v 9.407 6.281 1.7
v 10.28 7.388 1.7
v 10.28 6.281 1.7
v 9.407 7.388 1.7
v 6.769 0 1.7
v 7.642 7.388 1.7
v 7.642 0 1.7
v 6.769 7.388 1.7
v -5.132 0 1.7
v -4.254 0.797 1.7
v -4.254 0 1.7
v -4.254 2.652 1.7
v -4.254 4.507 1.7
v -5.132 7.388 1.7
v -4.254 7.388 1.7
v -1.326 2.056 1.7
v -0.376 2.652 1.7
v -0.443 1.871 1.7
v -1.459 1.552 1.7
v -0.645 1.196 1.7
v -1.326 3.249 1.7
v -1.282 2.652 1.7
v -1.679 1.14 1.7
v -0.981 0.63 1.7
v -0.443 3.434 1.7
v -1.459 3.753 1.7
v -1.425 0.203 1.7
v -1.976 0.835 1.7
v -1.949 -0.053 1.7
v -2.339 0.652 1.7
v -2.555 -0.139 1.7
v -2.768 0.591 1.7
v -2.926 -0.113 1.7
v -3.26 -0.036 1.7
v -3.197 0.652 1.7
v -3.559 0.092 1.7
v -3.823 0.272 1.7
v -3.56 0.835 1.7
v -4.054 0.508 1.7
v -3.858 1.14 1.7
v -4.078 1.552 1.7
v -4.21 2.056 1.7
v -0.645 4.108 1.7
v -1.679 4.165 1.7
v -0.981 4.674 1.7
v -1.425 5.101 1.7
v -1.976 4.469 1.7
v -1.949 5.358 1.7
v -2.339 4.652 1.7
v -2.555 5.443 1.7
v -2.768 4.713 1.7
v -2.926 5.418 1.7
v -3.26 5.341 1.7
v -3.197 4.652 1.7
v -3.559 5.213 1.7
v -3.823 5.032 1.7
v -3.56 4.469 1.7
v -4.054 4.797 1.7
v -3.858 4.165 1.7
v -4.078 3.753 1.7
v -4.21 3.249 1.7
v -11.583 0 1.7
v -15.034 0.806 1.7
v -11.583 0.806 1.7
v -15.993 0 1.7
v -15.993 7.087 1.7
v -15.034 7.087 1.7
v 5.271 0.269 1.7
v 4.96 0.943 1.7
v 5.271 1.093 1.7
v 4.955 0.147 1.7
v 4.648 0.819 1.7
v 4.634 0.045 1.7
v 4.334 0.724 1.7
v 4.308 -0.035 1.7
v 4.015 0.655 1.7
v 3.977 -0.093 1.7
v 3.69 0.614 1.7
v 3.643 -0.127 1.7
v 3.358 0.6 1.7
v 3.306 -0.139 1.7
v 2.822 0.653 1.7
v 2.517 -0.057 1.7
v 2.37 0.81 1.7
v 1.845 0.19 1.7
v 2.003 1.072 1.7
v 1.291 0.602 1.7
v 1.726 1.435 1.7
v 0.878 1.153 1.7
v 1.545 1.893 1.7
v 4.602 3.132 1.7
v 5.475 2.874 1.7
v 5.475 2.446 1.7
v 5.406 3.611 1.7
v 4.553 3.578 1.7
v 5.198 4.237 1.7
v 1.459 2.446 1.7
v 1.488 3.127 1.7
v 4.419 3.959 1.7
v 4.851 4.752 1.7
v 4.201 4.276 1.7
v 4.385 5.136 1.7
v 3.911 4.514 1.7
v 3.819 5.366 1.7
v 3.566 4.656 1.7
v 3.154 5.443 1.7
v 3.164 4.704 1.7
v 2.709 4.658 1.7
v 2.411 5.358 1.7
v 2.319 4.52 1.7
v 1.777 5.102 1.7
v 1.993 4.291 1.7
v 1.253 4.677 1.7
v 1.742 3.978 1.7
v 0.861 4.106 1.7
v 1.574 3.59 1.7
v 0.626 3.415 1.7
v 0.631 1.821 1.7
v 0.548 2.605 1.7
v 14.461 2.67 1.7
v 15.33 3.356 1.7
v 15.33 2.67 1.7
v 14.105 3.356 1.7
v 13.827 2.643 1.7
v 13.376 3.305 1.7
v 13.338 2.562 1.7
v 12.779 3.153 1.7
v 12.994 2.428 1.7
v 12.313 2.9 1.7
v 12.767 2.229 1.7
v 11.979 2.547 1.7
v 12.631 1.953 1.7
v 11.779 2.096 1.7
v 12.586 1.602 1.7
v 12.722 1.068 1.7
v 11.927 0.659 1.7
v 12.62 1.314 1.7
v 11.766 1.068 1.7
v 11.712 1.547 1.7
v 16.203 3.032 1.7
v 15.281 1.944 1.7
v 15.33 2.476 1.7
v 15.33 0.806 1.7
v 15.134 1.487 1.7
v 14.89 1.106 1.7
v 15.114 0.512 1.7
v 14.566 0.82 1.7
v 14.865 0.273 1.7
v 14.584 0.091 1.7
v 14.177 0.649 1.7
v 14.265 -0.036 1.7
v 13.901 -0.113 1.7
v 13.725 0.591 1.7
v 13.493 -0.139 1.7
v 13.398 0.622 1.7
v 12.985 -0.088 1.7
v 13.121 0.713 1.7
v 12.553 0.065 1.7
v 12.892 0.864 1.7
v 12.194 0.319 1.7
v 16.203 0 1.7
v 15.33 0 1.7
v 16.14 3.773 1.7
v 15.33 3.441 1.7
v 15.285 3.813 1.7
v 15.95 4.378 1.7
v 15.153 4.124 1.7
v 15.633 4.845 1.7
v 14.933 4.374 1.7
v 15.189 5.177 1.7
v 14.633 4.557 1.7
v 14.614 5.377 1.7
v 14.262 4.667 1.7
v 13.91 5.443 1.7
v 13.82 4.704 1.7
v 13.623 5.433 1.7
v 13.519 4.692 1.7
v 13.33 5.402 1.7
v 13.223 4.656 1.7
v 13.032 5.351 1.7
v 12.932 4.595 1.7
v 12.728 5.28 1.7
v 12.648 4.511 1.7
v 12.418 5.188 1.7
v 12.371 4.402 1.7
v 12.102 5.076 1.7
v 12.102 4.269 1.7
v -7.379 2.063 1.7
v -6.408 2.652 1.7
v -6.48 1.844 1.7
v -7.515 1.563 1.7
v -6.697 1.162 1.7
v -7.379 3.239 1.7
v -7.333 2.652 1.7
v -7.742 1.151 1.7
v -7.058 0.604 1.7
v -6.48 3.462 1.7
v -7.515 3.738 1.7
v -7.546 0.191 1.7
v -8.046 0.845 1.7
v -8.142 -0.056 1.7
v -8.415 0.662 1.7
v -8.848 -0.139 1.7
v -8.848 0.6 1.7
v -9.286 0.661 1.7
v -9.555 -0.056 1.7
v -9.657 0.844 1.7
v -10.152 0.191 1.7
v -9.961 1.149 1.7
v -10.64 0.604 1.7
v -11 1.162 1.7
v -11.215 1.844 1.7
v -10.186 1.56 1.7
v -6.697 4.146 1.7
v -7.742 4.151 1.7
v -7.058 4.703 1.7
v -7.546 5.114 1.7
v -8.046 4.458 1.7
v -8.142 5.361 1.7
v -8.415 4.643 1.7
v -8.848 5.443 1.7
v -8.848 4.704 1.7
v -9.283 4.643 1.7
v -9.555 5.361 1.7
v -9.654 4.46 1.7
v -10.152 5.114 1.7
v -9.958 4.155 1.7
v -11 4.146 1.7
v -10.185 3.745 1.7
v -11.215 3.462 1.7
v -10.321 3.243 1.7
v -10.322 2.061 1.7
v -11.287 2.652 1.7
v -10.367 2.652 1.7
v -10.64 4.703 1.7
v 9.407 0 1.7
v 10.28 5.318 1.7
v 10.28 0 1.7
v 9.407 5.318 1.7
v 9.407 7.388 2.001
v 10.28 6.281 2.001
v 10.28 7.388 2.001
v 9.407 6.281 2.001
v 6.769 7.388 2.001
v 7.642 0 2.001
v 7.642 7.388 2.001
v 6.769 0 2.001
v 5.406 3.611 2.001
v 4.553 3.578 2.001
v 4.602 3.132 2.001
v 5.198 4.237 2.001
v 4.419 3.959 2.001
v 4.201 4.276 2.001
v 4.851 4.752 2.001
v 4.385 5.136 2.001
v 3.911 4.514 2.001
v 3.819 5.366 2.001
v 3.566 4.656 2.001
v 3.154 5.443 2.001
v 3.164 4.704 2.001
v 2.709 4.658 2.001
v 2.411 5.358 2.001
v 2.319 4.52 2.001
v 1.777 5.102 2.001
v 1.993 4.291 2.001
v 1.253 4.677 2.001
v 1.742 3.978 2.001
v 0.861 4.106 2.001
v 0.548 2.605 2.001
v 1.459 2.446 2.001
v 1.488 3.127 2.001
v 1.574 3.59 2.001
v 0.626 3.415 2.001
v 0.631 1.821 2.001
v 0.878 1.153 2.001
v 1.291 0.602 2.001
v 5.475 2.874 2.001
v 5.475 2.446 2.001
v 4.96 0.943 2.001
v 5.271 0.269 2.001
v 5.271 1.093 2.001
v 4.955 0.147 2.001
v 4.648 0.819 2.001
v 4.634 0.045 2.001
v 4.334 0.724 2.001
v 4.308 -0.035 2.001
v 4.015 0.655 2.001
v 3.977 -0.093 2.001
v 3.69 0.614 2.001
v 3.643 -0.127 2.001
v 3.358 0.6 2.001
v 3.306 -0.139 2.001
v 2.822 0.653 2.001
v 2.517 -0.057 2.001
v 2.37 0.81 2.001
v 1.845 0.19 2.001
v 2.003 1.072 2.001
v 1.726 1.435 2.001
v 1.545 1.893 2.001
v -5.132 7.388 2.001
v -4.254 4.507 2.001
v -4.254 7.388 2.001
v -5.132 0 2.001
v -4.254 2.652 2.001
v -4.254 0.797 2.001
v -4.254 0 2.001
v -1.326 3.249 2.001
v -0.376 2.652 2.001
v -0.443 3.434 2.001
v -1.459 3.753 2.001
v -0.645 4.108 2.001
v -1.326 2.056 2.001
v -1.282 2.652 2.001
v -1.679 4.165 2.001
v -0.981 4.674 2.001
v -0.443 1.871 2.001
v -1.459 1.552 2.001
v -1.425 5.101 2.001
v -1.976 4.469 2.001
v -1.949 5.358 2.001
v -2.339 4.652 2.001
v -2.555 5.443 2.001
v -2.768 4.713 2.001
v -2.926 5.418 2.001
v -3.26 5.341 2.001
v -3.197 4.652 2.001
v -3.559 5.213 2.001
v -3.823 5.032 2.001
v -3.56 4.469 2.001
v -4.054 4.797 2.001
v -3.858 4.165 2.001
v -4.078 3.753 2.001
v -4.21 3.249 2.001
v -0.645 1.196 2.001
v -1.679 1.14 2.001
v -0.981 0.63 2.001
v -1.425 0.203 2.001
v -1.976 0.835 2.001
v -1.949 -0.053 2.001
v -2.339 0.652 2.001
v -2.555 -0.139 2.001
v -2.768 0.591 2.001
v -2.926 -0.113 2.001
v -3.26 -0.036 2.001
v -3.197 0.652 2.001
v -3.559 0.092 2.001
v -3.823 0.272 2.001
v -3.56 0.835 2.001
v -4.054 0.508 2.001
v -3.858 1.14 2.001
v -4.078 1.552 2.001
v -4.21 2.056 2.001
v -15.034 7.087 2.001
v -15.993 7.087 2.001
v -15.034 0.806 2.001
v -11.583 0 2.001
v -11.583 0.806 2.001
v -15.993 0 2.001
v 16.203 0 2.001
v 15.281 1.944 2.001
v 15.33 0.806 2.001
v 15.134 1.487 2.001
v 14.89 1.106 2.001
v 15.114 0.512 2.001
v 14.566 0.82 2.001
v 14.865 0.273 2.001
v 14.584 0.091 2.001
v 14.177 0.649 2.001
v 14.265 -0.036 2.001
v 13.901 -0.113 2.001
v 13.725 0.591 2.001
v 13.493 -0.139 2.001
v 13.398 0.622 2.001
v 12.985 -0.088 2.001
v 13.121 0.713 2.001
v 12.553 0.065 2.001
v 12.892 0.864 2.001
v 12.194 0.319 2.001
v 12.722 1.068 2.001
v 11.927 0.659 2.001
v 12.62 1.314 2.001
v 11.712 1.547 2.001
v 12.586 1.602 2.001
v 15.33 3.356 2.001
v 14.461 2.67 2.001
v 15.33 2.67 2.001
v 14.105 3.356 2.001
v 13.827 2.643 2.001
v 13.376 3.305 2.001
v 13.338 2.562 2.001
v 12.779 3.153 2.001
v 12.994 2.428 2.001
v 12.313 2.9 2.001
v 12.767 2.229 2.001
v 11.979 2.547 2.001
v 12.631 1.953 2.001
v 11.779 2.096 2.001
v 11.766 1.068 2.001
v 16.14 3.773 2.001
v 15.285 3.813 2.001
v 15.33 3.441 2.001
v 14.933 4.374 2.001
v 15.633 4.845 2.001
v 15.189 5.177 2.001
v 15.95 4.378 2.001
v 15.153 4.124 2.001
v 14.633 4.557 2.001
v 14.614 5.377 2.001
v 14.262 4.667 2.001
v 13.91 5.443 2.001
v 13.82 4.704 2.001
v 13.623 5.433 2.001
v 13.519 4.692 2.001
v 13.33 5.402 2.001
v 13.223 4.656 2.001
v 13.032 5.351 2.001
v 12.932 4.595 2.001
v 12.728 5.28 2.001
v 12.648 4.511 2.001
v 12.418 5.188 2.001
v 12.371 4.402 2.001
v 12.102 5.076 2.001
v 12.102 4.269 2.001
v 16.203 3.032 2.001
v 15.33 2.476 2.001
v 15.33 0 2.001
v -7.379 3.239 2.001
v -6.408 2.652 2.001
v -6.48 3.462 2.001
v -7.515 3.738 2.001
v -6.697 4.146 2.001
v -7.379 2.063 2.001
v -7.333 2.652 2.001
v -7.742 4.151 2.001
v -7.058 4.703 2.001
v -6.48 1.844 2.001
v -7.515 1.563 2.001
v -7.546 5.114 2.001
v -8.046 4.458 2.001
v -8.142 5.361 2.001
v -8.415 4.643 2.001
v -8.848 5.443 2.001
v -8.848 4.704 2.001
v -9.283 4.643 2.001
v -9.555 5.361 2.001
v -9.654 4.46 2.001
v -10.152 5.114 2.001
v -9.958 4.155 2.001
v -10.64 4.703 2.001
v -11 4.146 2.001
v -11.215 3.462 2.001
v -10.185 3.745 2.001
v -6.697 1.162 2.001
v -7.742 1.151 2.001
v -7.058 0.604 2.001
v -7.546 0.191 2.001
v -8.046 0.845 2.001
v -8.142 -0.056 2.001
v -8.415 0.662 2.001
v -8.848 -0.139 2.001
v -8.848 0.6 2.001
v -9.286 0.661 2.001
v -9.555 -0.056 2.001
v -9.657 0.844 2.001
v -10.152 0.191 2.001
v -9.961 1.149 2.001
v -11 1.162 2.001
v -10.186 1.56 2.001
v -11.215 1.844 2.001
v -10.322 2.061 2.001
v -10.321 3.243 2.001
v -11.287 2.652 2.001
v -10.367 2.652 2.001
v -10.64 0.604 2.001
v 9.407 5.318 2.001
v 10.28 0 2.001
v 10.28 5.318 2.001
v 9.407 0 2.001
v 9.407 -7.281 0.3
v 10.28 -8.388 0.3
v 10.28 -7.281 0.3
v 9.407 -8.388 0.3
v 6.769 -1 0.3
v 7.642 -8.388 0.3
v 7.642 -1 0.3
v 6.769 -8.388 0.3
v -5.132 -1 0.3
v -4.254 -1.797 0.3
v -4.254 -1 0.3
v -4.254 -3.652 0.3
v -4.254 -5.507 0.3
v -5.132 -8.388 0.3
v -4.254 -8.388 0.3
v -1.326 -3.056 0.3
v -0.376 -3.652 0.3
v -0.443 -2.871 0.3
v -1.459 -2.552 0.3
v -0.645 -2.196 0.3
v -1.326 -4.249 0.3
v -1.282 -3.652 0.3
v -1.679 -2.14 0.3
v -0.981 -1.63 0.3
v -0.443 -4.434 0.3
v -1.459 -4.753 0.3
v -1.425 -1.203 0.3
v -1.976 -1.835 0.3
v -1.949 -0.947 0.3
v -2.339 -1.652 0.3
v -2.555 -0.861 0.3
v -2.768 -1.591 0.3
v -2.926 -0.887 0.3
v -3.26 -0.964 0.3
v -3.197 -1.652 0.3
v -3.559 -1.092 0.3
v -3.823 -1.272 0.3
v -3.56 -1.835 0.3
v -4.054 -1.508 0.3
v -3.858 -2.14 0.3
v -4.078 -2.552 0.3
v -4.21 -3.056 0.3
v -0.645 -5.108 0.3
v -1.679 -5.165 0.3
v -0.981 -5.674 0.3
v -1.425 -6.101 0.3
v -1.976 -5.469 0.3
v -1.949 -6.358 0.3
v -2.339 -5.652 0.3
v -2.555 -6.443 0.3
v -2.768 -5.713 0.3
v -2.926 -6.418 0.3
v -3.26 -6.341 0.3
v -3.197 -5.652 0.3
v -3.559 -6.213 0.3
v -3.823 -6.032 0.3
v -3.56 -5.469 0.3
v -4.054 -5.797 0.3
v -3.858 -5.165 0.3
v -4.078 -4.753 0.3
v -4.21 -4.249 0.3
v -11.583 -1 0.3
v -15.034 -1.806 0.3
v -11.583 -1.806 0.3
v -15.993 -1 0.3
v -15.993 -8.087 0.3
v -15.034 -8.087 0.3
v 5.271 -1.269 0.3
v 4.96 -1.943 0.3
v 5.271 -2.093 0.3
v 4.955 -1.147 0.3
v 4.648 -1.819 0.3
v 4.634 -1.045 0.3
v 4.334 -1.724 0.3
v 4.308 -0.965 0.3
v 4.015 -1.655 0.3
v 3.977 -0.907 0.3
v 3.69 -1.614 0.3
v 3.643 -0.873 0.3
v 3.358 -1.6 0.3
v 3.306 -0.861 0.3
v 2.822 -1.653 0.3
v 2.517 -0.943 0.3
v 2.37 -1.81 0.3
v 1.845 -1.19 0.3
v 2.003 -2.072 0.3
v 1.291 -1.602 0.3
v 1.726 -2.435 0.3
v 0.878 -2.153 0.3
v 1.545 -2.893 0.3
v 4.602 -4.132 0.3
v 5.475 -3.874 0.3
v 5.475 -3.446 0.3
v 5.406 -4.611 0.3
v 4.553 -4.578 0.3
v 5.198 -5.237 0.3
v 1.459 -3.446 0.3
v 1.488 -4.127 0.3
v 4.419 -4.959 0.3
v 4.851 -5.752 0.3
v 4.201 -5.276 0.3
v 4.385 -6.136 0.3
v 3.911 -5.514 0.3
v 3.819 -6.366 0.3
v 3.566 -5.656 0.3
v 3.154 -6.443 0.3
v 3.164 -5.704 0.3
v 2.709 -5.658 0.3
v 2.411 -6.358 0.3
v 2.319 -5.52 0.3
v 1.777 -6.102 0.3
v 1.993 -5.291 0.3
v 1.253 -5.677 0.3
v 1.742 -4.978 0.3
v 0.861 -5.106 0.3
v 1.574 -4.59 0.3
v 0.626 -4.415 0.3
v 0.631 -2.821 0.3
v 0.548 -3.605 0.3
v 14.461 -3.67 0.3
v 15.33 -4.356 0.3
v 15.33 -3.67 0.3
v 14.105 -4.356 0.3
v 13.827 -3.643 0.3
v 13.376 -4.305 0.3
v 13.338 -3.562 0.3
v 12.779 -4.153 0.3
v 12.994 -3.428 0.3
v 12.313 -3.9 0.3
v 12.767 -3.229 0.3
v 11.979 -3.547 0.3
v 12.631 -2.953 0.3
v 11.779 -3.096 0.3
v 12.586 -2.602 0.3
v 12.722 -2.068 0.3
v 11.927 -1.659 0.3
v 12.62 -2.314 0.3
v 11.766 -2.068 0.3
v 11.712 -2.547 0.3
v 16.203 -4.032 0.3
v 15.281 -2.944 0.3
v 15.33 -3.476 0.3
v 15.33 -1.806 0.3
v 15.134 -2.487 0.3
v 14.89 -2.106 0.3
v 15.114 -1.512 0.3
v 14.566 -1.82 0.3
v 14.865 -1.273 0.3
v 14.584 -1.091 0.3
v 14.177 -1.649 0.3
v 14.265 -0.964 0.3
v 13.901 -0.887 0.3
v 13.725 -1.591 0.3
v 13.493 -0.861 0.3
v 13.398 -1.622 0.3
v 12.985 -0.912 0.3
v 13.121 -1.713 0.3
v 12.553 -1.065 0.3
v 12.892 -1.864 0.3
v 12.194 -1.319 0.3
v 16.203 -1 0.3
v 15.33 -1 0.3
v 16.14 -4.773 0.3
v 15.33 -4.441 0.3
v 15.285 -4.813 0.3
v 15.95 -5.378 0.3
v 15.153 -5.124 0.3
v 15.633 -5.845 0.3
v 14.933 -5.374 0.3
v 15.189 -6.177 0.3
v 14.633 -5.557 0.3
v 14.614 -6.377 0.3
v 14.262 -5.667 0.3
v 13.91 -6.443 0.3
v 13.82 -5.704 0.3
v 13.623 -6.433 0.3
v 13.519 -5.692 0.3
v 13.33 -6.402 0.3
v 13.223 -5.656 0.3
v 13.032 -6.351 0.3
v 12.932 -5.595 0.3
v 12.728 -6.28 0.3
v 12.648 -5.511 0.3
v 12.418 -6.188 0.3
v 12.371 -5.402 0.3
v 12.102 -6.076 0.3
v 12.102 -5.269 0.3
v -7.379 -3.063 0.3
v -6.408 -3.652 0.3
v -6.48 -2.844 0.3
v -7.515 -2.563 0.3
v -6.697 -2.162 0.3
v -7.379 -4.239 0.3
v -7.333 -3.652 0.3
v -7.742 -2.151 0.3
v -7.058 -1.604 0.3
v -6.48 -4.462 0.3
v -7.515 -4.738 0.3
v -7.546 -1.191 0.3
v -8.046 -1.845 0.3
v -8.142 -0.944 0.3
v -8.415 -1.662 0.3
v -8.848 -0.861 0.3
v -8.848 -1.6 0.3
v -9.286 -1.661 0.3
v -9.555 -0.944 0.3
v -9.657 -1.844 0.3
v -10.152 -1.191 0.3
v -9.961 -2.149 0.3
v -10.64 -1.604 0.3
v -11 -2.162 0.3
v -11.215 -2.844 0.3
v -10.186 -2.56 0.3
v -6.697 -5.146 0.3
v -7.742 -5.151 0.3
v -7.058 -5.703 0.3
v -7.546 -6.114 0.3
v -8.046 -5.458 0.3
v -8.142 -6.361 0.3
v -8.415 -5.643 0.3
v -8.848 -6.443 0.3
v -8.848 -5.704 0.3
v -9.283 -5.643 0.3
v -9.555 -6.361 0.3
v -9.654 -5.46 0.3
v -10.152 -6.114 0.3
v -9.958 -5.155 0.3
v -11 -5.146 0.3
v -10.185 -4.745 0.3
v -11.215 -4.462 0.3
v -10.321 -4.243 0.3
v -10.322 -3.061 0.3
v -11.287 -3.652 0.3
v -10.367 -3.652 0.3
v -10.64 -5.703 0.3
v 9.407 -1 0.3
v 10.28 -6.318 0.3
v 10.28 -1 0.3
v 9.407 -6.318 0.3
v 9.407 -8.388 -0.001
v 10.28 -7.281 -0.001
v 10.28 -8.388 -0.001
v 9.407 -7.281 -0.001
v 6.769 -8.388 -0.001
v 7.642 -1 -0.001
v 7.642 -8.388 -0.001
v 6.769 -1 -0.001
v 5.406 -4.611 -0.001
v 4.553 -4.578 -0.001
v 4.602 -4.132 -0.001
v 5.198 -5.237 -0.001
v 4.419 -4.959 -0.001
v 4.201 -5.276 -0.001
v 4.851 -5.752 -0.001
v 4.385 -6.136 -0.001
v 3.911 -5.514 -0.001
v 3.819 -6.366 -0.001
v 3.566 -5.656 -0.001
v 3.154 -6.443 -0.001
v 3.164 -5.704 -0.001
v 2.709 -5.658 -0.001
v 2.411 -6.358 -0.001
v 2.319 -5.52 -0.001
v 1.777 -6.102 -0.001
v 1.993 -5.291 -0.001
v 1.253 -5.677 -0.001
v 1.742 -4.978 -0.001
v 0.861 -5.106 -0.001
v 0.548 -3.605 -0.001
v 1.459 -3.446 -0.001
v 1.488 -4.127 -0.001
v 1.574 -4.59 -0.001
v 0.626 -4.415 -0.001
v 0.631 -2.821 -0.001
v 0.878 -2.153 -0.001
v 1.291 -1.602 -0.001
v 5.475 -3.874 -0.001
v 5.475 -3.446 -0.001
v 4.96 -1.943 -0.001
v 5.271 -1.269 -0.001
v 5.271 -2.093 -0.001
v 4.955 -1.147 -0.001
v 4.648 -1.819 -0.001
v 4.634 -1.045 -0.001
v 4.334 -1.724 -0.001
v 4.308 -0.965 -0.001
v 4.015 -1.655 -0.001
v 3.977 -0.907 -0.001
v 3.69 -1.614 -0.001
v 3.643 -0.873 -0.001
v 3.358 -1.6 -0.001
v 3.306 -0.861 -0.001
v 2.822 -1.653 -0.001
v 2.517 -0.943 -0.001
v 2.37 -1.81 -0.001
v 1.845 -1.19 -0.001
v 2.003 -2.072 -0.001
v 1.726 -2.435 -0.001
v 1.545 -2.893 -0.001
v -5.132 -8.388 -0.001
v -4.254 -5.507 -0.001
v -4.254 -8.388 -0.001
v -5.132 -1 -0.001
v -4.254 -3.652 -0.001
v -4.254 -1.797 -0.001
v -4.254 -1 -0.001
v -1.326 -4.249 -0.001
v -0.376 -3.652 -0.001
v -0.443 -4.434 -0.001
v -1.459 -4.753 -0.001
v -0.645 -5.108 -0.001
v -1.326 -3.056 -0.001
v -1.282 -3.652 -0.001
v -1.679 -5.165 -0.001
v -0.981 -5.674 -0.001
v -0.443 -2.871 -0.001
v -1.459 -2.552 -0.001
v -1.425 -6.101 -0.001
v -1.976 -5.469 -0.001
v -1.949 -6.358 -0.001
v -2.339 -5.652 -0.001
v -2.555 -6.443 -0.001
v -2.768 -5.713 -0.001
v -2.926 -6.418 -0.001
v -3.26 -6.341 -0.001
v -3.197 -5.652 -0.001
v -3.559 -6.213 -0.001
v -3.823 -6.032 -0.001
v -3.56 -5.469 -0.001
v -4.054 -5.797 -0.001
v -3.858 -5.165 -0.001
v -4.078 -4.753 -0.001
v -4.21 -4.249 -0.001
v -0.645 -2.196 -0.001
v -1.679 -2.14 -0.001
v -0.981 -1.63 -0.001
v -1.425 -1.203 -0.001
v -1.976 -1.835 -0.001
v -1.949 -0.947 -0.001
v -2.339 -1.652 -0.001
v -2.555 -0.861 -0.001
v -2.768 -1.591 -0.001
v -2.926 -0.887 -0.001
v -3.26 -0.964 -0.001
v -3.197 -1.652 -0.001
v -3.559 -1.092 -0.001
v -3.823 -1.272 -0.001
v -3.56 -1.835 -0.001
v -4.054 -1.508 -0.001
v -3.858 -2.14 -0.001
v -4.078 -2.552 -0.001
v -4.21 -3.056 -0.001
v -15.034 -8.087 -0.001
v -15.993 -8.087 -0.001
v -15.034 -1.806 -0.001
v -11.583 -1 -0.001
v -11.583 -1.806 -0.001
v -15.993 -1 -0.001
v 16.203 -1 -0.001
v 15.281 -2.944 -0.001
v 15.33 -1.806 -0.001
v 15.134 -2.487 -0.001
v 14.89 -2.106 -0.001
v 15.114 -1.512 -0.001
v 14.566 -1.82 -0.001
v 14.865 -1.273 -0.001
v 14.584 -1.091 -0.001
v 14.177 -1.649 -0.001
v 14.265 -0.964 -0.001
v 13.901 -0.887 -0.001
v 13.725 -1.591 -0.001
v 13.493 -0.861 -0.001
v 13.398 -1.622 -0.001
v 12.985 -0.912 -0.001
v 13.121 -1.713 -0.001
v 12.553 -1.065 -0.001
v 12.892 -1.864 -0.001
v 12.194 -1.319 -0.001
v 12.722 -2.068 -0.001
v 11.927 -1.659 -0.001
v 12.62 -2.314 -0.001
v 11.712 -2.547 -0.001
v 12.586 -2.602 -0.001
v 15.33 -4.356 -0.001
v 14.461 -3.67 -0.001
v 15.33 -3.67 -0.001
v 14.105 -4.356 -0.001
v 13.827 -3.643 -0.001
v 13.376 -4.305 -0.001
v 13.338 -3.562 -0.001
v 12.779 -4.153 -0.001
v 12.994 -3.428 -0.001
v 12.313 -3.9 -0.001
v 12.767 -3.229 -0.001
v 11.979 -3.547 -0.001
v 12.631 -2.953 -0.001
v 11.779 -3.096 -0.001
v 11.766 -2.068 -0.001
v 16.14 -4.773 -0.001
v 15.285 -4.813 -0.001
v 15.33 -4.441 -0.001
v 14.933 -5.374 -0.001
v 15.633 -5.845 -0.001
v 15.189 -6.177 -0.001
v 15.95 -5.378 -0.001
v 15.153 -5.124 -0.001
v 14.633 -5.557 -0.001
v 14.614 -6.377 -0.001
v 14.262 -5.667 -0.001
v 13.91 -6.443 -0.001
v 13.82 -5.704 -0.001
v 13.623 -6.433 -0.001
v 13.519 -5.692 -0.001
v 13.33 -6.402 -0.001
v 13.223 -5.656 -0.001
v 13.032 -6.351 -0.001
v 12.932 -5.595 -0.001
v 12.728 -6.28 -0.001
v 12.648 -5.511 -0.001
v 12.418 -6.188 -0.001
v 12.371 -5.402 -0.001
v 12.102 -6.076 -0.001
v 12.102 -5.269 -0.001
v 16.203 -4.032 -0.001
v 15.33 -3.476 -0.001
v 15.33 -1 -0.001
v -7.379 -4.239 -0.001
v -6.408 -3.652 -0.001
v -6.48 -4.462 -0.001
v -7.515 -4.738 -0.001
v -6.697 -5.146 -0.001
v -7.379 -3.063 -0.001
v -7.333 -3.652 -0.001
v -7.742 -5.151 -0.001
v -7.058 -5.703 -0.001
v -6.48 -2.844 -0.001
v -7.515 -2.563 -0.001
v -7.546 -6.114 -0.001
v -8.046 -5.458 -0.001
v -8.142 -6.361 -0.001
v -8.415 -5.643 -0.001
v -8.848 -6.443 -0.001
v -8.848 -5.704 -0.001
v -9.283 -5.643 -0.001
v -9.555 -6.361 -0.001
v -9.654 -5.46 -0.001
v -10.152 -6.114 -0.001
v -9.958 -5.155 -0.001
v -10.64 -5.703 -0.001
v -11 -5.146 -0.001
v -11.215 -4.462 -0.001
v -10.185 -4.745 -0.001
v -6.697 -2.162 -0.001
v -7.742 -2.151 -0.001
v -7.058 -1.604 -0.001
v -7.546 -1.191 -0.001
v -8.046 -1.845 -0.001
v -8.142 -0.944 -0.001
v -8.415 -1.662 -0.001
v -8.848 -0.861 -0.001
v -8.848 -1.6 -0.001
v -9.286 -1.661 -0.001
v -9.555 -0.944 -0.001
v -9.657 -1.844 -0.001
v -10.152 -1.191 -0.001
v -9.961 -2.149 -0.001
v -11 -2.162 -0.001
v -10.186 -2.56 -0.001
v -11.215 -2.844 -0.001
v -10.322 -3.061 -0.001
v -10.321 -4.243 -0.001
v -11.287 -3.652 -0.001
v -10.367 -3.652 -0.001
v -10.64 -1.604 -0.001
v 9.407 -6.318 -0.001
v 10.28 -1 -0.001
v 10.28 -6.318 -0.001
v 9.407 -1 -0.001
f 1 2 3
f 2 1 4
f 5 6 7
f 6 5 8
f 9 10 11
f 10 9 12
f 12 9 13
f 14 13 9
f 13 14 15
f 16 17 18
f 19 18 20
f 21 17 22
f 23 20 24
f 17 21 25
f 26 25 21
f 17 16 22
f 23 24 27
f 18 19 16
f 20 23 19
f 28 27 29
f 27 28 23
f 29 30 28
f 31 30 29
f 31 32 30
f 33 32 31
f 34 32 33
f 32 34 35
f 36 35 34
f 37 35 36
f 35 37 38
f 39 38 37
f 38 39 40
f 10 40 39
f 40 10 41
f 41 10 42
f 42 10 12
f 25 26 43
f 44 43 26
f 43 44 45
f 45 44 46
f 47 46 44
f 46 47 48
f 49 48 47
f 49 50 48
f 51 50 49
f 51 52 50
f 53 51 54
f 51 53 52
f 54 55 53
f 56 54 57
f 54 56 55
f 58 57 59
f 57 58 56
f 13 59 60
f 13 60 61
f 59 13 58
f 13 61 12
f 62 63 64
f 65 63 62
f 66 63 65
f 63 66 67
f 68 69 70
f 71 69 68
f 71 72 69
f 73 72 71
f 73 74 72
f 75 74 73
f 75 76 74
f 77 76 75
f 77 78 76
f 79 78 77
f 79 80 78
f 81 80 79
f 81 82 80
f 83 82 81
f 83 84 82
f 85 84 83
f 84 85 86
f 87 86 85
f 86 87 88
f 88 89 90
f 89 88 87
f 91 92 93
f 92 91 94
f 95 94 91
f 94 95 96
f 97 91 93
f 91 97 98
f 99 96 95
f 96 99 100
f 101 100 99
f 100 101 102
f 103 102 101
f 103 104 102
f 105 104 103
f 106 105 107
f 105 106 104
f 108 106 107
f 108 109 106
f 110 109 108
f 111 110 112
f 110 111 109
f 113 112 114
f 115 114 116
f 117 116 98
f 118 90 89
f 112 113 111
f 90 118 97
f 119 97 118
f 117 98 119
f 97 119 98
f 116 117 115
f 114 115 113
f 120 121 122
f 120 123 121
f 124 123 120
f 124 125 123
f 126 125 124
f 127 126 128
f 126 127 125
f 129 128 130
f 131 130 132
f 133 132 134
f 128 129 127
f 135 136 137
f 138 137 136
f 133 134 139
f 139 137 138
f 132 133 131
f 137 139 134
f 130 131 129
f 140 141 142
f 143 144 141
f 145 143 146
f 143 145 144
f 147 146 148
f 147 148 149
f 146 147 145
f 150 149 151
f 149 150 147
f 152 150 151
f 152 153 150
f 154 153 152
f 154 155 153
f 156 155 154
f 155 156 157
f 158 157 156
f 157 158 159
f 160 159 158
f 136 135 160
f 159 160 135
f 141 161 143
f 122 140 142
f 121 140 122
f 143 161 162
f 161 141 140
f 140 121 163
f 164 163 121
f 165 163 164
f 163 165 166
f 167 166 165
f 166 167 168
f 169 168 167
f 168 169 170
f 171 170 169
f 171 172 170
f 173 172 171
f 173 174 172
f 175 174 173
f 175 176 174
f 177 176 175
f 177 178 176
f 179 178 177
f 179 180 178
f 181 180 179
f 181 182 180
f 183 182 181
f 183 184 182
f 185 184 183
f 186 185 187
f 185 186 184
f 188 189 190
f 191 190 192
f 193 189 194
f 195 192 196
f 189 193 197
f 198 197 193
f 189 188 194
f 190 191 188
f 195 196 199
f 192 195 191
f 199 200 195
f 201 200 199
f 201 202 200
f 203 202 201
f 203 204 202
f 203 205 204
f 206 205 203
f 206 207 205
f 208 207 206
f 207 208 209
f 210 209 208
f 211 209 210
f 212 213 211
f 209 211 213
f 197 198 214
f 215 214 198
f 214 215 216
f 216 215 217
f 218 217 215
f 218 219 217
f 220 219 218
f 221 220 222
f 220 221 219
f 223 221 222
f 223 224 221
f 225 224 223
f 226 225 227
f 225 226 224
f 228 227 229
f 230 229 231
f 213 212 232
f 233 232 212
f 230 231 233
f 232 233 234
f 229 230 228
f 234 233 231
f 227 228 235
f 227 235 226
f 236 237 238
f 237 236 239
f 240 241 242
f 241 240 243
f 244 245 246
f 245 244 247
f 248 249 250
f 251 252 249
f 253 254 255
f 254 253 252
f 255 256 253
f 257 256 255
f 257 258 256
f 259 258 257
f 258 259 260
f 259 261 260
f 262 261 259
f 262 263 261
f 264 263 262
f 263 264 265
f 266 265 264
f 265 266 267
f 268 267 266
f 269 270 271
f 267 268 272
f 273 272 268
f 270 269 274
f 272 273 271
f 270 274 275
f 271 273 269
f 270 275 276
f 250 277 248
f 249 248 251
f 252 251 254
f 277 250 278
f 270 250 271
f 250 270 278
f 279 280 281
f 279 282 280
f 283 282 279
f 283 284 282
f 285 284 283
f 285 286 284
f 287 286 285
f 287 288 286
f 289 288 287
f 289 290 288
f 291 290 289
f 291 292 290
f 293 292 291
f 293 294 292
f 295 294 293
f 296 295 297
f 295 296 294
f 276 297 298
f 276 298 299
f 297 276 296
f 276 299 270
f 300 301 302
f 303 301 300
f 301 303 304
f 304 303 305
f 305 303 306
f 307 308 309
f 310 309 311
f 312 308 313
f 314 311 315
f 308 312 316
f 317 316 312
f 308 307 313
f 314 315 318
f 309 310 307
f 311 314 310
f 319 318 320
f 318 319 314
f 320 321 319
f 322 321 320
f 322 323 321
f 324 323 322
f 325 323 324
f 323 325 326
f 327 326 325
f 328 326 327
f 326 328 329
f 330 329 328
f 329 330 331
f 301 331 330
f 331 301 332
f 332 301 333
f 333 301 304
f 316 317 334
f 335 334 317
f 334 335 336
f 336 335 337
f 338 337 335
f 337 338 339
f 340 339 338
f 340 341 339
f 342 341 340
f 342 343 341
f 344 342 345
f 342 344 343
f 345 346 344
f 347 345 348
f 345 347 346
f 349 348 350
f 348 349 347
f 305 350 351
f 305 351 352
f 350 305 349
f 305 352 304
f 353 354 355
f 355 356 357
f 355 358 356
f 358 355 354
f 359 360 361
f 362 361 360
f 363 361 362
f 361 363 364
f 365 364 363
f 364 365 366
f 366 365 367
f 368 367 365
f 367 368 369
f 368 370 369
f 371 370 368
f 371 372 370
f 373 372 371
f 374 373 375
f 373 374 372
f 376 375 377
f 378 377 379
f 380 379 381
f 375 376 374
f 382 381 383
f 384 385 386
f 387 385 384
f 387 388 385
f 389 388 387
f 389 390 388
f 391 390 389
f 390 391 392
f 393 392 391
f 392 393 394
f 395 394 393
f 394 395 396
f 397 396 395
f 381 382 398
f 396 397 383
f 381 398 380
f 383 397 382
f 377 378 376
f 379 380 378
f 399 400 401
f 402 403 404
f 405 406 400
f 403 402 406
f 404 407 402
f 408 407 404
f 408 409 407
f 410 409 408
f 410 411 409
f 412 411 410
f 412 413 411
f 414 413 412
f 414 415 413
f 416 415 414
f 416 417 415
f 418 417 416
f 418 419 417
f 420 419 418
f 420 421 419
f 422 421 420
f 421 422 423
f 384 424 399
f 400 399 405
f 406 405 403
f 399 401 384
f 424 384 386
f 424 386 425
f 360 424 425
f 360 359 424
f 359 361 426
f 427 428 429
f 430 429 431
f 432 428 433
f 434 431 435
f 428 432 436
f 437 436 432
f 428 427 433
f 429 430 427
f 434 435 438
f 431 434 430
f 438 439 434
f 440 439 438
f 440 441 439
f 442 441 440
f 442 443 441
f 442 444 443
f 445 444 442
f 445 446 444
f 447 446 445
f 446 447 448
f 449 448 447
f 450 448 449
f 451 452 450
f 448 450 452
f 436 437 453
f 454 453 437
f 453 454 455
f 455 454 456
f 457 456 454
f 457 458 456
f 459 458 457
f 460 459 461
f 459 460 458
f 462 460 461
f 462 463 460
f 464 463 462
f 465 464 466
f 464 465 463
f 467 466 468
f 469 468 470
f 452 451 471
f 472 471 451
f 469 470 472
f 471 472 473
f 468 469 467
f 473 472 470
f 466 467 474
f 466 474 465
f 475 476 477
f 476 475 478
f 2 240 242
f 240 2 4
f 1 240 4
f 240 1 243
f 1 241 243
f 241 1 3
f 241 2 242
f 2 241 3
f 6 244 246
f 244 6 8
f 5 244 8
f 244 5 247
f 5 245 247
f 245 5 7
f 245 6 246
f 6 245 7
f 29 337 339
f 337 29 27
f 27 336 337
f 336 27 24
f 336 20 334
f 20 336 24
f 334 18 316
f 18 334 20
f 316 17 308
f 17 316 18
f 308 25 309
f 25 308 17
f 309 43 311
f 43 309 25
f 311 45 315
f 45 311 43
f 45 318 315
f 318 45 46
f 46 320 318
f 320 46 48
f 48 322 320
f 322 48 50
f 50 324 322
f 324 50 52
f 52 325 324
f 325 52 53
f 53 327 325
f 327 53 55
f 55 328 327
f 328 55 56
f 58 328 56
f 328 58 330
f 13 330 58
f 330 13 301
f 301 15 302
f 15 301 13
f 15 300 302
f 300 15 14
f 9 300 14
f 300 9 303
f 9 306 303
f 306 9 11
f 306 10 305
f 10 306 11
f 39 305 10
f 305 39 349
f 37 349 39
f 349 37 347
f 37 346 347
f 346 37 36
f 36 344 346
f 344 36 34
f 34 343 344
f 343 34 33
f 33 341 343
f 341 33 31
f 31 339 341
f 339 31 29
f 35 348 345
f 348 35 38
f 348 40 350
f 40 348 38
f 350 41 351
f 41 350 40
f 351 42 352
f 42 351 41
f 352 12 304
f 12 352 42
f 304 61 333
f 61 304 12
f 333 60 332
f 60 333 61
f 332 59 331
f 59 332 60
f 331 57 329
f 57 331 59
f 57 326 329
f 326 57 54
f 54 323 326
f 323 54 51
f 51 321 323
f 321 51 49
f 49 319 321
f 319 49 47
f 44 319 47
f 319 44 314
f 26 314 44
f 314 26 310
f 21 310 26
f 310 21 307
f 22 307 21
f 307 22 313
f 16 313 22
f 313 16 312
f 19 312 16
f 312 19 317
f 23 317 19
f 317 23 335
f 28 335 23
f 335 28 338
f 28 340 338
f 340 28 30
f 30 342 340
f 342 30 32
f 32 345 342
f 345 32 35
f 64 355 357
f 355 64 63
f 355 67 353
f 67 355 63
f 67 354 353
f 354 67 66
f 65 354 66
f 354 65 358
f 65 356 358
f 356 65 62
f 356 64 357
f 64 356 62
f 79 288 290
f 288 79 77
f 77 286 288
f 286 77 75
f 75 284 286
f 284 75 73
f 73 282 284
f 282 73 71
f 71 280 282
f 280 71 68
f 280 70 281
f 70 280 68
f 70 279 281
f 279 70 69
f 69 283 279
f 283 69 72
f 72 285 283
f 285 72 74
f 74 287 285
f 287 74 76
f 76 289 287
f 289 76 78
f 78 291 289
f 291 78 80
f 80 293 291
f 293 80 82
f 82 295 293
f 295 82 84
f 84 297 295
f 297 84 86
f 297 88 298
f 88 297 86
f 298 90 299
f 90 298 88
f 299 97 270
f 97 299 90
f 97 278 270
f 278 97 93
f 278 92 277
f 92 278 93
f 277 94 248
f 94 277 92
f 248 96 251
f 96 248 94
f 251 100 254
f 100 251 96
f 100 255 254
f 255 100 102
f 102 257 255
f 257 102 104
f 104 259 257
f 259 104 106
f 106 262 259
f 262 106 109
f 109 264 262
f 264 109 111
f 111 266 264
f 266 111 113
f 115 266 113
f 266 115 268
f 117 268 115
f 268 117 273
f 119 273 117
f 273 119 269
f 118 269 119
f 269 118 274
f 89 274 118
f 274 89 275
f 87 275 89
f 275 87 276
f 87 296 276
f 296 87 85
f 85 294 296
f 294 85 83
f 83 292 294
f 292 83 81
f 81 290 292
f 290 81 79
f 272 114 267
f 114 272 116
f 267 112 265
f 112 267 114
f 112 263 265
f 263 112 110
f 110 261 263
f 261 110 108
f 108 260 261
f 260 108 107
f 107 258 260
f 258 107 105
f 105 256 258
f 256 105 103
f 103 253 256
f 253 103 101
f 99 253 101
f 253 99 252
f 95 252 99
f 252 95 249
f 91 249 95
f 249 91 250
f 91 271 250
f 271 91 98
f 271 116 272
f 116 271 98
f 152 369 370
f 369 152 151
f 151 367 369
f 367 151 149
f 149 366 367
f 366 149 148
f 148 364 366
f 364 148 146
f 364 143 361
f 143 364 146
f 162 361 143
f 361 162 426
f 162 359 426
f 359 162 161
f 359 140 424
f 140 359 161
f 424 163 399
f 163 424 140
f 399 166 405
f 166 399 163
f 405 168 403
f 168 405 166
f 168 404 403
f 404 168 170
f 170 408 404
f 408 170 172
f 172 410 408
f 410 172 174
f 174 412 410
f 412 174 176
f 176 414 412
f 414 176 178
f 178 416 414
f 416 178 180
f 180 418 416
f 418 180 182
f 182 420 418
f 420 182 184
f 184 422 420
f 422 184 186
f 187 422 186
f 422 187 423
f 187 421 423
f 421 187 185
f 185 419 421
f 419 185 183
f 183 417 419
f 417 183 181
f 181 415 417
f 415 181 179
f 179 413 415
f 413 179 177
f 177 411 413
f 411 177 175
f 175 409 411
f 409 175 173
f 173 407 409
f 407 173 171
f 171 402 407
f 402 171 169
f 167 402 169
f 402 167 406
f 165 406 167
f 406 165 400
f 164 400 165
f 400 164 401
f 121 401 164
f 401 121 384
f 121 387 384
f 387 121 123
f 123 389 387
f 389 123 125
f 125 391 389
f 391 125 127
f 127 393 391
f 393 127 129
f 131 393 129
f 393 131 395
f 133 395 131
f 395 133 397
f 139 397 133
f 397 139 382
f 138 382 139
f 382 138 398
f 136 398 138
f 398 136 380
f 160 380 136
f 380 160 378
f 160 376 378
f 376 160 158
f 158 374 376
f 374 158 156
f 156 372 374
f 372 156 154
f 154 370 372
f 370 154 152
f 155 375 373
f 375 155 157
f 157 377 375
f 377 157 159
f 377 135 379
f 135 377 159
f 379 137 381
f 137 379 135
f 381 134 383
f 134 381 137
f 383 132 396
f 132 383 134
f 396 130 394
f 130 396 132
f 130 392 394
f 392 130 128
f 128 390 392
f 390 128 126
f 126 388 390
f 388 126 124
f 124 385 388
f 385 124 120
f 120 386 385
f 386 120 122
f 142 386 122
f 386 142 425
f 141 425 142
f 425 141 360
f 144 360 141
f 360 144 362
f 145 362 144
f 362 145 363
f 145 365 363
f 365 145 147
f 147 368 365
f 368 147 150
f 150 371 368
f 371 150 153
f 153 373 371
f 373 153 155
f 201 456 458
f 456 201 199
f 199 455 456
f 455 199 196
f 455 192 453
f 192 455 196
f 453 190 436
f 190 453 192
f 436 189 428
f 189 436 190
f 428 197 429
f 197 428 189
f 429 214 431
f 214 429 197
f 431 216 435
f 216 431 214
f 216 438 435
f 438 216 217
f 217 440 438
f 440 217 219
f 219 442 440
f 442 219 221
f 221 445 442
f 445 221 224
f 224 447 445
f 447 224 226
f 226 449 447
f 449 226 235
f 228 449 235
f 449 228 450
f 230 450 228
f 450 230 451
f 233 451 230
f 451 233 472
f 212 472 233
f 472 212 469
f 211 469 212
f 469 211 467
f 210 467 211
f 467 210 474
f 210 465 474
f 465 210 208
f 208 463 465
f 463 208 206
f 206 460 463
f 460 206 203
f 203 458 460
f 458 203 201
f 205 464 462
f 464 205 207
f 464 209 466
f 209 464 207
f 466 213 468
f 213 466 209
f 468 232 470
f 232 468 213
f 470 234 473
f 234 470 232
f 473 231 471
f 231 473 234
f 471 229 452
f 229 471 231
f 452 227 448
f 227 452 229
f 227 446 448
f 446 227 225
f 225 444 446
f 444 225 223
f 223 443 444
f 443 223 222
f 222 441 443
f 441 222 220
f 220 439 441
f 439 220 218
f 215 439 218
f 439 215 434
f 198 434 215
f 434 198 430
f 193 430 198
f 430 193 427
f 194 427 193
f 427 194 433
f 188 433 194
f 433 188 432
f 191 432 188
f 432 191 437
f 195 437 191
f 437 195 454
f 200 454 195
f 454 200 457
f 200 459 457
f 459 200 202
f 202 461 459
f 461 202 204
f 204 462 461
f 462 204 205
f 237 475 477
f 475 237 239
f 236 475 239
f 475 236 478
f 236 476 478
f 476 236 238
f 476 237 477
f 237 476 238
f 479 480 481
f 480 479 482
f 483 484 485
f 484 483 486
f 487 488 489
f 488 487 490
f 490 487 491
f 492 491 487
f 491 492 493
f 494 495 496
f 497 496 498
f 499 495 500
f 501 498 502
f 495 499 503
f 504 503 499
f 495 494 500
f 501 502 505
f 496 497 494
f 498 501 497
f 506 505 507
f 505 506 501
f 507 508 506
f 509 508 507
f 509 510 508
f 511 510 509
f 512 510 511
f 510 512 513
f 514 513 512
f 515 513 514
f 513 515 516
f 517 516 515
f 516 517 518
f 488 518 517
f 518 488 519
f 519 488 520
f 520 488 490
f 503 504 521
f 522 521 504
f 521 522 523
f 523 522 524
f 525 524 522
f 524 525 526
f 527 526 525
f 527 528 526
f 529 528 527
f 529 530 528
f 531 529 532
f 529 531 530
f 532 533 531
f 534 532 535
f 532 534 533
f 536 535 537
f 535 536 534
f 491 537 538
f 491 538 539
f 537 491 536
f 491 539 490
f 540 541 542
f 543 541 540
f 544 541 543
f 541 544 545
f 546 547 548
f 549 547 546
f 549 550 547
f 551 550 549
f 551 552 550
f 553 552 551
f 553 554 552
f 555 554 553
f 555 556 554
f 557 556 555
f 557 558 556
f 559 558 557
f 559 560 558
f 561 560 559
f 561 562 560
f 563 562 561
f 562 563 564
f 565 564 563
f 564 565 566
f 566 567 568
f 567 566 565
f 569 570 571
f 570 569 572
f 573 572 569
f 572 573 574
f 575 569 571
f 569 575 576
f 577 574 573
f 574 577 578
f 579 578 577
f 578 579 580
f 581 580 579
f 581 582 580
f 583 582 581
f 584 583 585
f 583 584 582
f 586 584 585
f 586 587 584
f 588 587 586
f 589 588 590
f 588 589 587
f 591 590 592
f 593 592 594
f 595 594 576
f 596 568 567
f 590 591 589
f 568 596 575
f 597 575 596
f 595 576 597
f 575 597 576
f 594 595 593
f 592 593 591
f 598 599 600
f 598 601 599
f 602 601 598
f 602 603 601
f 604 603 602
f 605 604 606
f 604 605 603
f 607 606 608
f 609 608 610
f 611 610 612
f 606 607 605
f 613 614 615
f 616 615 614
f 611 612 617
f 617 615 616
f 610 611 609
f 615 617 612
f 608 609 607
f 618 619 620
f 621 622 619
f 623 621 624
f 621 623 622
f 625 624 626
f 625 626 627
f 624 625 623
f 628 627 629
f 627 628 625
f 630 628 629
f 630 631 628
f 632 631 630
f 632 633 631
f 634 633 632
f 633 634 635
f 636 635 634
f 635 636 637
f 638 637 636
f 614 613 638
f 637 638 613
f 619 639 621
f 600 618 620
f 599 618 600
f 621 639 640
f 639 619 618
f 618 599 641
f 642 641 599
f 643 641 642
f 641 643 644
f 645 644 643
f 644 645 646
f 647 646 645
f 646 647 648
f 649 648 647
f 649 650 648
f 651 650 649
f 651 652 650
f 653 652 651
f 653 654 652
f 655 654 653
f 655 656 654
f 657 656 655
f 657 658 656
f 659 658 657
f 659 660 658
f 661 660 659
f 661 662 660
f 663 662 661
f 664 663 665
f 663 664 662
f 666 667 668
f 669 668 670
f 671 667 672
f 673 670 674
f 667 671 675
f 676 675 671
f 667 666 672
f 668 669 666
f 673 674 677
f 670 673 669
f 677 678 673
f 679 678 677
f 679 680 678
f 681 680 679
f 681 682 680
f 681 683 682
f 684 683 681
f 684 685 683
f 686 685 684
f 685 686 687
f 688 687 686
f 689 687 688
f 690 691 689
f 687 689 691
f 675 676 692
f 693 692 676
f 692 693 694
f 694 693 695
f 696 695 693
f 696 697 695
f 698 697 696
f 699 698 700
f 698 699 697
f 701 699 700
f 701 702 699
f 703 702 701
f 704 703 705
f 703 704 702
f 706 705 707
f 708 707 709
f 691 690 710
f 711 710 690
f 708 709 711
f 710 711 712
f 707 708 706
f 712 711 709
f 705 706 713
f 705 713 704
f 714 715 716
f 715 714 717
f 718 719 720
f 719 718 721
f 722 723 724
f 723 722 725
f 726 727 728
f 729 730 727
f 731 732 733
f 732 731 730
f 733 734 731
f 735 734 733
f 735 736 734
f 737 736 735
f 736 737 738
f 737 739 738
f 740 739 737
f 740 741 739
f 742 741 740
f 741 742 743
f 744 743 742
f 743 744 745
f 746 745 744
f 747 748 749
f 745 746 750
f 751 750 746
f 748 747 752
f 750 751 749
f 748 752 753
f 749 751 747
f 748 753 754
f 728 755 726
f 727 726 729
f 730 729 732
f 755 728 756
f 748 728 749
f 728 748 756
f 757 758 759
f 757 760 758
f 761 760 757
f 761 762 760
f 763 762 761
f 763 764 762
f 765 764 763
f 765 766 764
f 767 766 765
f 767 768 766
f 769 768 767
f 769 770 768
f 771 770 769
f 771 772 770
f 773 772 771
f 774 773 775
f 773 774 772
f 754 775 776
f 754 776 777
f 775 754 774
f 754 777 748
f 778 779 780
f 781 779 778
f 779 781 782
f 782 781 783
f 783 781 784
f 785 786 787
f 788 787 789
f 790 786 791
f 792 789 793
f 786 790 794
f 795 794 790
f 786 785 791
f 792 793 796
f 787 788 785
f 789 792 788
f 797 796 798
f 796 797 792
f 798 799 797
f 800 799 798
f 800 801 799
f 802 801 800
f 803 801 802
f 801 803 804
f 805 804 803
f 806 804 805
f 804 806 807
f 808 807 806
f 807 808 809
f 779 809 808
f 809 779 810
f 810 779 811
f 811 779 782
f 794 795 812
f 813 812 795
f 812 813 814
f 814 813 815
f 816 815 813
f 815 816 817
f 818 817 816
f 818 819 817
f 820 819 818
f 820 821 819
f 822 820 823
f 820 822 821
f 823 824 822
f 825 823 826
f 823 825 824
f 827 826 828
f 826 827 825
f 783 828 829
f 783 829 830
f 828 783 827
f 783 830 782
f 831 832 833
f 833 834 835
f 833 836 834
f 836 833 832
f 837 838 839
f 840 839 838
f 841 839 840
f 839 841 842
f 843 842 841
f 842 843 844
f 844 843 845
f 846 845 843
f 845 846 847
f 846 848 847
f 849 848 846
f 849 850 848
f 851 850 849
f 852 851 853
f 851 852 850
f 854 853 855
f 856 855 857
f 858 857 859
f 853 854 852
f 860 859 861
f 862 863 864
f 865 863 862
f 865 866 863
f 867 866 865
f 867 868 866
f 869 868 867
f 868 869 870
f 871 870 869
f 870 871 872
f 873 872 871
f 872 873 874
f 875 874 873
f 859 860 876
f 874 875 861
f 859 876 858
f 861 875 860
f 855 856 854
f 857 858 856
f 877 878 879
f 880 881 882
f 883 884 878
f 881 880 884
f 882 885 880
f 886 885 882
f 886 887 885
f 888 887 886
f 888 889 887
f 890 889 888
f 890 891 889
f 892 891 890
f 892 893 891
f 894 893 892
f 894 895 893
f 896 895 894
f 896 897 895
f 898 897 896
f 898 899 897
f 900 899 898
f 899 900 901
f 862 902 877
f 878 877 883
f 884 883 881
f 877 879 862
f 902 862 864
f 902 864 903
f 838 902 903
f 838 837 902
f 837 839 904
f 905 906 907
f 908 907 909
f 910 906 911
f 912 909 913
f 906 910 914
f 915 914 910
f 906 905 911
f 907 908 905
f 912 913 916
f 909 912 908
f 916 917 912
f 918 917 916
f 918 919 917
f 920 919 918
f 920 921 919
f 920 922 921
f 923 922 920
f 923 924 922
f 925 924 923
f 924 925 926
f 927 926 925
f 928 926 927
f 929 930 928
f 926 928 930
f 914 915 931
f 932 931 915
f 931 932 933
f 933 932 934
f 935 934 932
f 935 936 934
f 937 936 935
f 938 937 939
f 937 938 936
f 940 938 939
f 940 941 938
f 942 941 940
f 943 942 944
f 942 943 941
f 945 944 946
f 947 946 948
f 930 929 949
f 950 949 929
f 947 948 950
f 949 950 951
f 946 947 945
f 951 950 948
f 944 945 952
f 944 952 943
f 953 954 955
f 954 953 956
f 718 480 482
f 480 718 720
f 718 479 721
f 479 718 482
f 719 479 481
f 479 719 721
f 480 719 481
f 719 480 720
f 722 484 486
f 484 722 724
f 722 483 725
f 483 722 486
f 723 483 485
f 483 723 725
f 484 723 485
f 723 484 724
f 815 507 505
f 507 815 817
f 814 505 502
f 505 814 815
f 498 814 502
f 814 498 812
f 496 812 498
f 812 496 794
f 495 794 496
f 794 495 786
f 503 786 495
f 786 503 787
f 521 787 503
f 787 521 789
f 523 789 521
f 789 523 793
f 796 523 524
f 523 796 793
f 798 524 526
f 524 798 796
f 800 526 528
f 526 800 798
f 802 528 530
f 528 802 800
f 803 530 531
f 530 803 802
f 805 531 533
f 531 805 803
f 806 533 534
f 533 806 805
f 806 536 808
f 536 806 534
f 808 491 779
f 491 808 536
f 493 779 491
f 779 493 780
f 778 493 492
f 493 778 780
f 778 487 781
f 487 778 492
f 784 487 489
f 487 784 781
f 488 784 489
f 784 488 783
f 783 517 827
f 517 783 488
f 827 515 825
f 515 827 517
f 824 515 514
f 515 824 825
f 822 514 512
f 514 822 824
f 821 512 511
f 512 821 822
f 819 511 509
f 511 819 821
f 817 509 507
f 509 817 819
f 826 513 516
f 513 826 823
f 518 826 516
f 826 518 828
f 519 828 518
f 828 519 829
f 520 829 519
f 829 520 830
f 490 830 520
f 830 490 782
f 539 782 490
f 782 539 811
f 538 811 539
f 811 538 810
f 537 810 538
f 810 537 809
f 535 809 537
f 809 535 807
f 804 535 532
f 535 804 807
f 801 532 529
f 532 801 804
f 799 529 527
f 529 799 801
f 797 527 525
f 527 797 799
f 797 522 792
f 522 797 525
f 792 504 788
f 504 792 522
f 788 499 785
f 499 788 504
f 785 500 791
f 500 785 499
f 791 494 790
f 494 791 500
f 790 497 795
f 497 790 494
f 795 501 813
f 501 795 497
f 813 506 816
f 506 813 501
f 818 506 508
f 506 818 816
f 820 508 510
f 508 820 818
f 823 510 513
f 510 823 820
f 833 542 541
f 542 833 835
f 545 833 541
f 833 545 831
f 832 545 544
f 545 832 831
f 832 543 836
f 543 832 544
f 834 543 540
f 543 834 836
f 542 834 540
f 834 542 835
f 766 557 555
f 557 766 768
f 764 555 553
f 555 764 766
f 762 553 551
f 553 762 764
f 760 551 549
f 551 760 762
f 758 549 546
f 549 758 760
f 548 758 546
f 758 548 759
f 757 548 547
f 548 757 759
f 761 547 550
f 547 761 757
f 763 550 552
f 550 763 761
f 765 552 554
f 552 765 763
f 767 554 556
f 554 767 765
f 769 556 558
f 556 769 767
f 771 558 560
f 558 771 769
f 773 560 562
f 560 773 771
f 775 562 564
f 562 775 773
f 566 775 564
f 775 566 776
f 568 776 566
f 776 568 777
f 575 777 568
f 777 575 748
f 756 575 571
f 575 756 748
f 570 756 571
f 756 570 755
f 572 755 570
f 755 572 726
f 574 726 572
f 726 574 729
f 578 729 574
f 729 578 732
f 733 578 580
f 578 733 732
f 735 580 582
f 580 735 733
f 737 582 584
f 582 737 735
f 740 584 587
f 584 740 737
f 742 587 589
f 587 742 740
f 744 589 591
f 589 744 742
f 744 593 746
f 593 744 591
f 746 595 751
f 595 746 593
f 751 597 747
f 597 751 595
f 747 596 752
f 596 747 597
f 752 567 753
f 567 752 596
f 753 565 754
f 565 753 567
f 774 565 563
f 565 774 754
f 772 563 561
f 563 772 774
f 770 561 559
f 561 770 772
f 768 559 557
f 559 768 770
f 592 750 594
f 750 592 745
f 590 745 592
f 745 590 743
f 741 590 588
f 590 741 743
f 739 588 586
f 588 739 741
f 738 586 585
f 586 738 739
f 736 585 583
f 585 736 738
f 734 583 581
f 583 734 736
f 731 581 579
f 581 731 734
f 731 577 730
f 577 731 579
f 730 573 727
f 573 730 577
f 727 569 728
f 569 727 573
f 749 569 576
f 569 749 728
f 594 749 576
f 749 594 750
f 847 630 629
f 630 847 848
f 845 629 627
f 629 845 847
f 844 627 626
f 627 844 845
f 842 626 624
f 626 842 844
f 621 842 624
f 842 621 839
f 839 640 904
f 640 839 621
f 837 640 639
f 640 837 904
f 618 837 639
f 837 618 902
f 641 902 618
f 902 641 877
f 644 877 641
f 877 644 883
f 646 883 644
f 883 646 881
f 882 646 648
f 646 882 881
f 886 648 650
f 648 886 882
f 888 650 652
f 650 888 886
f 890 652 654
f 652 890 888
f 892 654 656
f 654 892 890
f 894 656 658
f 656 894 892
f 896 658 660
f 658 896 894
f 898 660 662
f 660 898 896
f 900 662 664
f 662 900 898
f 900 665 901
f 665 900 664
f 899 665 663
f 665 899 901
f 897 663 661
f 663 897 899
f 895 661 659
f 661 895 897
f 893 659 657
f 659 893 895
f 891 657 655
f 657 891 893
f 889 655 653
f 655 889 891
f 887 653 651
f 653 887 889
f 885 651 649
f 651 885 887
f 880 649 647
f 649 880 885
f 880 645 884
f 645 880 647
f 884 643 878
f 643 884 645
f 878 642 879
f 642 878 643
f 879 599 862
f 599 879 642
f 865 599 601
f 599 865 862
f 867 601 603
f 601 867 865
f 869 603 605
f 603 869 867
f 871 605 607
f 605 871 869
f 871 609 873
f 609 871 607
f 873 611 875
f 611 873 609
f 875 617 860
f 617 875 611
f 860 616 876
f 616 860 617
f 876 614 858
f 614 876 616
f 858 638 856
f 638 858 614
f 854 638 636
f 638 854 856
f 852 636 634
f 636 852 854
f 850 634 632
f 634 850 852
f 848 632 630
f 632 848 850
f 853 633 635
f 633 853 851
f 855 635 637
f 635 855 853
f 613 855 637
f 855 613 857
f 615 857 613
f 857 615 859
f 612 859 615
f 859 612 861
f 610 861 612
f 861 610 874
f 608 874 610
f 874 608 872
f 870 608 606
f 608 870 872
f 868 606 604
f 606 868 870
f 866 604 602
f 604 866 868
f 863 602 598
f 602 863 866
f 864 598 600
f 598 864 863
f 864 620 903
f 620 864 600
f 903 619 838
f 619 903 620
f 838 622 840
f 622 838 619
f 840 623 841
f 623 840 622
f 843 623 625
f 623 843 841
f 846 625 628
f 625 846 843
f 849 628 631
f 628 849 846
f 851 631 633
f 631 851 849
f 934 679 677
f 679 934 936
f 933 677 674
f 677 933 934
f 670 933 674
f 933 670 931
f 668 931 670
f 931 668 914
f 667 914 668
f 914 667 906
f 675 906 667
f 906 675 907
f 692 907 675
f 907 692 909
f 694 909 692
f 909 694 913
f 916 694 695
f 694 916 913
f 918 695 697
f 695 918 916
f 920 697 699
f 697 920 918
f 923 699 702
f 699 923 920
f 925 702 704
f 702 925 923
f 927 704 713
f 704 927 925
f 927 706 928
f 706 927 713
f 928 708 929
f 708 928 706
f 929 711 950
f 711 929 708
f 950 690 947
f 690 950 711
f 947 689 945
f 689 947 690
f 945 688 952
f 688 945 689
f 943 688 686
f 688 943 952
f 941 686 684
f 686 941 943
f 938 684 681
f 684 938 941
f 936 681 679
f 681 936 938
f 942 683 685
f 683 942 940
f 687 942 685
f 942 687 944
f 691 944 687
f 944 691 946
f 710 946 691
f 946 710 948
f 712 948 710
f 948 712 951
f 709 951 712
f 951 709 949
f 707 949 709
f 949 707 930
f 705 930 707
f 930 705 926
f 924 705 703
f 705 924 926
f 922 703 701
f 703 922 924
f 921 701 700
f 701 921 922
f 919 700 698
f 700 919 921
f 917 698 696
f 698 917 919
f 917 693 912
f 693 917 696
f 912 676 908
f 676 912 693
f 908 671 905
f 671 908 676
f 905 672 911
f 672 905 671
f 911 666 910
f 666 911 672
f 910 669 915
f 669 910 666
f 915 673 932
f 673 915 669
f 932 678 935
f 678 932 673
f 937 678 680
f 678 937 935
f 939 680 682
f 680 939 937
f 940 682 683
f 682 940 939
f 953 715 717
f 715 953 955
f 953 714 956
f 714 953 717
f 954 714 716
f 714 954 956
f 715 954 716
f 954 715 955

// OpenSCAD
letter="Lobelia";
smallText="";
    
length = 90;    
textStart = 0; 
height = 2; 

module GetText(bigText, littleText) { 
    union() {         
        translate([textStart, 0, 1.7])
            color("black", 1)
                linear_extrude(height=.301, convexity=4)
                    text(bigText, 
                    font="Bitstream Vera Sans",
                    halign="center",
                    size=7
                    );
        
        translate([textStart, -8, 1.7])
            color("black", 1)
                linear_extrude(height=.301, convexity=4)
                    text(littleText, 
                    font="Bitstream Vera Sans",
                    halign="center",
                    size=5// 3 is too small, doesn't extrude
                          // 4 is readable, but leaves gaps
                    );
            }
}

// First extrusion 
*difference () { 
    color("white", 1.0)
        union() { 
            //stem
            translate([-length/2 - 100, -2, 0])
                cube([100, 4, height]);
            
            // tapered neck 
            linear_extrude(height) { 
                polygon(points=[[-length/2 -30, 0], [-length / 2, +10], [-length /2, -10], [-length / 2 - 30, 0]]);
            } 
            
            //Broad flat area for text
            translate([-length/2, -10, 0])
                cube([length, 20, height], center=false) ;
        }
    
    // holes for text 
    color("black", 1) 
        union() { 
            GetText(letter, smallText); 

            rotate([180, 0, 0])
                translate([textStart, 1, -2])
                    GetText(letter, smallText); 
        }
}

// Second Extrusion
/*marker_two*/union() { 
    GetText(letter, smallText); 

    rotate([180, 0, 0])
        translate([textStart, 1, -2])
            GetText(letter, smallText); 
}

    
